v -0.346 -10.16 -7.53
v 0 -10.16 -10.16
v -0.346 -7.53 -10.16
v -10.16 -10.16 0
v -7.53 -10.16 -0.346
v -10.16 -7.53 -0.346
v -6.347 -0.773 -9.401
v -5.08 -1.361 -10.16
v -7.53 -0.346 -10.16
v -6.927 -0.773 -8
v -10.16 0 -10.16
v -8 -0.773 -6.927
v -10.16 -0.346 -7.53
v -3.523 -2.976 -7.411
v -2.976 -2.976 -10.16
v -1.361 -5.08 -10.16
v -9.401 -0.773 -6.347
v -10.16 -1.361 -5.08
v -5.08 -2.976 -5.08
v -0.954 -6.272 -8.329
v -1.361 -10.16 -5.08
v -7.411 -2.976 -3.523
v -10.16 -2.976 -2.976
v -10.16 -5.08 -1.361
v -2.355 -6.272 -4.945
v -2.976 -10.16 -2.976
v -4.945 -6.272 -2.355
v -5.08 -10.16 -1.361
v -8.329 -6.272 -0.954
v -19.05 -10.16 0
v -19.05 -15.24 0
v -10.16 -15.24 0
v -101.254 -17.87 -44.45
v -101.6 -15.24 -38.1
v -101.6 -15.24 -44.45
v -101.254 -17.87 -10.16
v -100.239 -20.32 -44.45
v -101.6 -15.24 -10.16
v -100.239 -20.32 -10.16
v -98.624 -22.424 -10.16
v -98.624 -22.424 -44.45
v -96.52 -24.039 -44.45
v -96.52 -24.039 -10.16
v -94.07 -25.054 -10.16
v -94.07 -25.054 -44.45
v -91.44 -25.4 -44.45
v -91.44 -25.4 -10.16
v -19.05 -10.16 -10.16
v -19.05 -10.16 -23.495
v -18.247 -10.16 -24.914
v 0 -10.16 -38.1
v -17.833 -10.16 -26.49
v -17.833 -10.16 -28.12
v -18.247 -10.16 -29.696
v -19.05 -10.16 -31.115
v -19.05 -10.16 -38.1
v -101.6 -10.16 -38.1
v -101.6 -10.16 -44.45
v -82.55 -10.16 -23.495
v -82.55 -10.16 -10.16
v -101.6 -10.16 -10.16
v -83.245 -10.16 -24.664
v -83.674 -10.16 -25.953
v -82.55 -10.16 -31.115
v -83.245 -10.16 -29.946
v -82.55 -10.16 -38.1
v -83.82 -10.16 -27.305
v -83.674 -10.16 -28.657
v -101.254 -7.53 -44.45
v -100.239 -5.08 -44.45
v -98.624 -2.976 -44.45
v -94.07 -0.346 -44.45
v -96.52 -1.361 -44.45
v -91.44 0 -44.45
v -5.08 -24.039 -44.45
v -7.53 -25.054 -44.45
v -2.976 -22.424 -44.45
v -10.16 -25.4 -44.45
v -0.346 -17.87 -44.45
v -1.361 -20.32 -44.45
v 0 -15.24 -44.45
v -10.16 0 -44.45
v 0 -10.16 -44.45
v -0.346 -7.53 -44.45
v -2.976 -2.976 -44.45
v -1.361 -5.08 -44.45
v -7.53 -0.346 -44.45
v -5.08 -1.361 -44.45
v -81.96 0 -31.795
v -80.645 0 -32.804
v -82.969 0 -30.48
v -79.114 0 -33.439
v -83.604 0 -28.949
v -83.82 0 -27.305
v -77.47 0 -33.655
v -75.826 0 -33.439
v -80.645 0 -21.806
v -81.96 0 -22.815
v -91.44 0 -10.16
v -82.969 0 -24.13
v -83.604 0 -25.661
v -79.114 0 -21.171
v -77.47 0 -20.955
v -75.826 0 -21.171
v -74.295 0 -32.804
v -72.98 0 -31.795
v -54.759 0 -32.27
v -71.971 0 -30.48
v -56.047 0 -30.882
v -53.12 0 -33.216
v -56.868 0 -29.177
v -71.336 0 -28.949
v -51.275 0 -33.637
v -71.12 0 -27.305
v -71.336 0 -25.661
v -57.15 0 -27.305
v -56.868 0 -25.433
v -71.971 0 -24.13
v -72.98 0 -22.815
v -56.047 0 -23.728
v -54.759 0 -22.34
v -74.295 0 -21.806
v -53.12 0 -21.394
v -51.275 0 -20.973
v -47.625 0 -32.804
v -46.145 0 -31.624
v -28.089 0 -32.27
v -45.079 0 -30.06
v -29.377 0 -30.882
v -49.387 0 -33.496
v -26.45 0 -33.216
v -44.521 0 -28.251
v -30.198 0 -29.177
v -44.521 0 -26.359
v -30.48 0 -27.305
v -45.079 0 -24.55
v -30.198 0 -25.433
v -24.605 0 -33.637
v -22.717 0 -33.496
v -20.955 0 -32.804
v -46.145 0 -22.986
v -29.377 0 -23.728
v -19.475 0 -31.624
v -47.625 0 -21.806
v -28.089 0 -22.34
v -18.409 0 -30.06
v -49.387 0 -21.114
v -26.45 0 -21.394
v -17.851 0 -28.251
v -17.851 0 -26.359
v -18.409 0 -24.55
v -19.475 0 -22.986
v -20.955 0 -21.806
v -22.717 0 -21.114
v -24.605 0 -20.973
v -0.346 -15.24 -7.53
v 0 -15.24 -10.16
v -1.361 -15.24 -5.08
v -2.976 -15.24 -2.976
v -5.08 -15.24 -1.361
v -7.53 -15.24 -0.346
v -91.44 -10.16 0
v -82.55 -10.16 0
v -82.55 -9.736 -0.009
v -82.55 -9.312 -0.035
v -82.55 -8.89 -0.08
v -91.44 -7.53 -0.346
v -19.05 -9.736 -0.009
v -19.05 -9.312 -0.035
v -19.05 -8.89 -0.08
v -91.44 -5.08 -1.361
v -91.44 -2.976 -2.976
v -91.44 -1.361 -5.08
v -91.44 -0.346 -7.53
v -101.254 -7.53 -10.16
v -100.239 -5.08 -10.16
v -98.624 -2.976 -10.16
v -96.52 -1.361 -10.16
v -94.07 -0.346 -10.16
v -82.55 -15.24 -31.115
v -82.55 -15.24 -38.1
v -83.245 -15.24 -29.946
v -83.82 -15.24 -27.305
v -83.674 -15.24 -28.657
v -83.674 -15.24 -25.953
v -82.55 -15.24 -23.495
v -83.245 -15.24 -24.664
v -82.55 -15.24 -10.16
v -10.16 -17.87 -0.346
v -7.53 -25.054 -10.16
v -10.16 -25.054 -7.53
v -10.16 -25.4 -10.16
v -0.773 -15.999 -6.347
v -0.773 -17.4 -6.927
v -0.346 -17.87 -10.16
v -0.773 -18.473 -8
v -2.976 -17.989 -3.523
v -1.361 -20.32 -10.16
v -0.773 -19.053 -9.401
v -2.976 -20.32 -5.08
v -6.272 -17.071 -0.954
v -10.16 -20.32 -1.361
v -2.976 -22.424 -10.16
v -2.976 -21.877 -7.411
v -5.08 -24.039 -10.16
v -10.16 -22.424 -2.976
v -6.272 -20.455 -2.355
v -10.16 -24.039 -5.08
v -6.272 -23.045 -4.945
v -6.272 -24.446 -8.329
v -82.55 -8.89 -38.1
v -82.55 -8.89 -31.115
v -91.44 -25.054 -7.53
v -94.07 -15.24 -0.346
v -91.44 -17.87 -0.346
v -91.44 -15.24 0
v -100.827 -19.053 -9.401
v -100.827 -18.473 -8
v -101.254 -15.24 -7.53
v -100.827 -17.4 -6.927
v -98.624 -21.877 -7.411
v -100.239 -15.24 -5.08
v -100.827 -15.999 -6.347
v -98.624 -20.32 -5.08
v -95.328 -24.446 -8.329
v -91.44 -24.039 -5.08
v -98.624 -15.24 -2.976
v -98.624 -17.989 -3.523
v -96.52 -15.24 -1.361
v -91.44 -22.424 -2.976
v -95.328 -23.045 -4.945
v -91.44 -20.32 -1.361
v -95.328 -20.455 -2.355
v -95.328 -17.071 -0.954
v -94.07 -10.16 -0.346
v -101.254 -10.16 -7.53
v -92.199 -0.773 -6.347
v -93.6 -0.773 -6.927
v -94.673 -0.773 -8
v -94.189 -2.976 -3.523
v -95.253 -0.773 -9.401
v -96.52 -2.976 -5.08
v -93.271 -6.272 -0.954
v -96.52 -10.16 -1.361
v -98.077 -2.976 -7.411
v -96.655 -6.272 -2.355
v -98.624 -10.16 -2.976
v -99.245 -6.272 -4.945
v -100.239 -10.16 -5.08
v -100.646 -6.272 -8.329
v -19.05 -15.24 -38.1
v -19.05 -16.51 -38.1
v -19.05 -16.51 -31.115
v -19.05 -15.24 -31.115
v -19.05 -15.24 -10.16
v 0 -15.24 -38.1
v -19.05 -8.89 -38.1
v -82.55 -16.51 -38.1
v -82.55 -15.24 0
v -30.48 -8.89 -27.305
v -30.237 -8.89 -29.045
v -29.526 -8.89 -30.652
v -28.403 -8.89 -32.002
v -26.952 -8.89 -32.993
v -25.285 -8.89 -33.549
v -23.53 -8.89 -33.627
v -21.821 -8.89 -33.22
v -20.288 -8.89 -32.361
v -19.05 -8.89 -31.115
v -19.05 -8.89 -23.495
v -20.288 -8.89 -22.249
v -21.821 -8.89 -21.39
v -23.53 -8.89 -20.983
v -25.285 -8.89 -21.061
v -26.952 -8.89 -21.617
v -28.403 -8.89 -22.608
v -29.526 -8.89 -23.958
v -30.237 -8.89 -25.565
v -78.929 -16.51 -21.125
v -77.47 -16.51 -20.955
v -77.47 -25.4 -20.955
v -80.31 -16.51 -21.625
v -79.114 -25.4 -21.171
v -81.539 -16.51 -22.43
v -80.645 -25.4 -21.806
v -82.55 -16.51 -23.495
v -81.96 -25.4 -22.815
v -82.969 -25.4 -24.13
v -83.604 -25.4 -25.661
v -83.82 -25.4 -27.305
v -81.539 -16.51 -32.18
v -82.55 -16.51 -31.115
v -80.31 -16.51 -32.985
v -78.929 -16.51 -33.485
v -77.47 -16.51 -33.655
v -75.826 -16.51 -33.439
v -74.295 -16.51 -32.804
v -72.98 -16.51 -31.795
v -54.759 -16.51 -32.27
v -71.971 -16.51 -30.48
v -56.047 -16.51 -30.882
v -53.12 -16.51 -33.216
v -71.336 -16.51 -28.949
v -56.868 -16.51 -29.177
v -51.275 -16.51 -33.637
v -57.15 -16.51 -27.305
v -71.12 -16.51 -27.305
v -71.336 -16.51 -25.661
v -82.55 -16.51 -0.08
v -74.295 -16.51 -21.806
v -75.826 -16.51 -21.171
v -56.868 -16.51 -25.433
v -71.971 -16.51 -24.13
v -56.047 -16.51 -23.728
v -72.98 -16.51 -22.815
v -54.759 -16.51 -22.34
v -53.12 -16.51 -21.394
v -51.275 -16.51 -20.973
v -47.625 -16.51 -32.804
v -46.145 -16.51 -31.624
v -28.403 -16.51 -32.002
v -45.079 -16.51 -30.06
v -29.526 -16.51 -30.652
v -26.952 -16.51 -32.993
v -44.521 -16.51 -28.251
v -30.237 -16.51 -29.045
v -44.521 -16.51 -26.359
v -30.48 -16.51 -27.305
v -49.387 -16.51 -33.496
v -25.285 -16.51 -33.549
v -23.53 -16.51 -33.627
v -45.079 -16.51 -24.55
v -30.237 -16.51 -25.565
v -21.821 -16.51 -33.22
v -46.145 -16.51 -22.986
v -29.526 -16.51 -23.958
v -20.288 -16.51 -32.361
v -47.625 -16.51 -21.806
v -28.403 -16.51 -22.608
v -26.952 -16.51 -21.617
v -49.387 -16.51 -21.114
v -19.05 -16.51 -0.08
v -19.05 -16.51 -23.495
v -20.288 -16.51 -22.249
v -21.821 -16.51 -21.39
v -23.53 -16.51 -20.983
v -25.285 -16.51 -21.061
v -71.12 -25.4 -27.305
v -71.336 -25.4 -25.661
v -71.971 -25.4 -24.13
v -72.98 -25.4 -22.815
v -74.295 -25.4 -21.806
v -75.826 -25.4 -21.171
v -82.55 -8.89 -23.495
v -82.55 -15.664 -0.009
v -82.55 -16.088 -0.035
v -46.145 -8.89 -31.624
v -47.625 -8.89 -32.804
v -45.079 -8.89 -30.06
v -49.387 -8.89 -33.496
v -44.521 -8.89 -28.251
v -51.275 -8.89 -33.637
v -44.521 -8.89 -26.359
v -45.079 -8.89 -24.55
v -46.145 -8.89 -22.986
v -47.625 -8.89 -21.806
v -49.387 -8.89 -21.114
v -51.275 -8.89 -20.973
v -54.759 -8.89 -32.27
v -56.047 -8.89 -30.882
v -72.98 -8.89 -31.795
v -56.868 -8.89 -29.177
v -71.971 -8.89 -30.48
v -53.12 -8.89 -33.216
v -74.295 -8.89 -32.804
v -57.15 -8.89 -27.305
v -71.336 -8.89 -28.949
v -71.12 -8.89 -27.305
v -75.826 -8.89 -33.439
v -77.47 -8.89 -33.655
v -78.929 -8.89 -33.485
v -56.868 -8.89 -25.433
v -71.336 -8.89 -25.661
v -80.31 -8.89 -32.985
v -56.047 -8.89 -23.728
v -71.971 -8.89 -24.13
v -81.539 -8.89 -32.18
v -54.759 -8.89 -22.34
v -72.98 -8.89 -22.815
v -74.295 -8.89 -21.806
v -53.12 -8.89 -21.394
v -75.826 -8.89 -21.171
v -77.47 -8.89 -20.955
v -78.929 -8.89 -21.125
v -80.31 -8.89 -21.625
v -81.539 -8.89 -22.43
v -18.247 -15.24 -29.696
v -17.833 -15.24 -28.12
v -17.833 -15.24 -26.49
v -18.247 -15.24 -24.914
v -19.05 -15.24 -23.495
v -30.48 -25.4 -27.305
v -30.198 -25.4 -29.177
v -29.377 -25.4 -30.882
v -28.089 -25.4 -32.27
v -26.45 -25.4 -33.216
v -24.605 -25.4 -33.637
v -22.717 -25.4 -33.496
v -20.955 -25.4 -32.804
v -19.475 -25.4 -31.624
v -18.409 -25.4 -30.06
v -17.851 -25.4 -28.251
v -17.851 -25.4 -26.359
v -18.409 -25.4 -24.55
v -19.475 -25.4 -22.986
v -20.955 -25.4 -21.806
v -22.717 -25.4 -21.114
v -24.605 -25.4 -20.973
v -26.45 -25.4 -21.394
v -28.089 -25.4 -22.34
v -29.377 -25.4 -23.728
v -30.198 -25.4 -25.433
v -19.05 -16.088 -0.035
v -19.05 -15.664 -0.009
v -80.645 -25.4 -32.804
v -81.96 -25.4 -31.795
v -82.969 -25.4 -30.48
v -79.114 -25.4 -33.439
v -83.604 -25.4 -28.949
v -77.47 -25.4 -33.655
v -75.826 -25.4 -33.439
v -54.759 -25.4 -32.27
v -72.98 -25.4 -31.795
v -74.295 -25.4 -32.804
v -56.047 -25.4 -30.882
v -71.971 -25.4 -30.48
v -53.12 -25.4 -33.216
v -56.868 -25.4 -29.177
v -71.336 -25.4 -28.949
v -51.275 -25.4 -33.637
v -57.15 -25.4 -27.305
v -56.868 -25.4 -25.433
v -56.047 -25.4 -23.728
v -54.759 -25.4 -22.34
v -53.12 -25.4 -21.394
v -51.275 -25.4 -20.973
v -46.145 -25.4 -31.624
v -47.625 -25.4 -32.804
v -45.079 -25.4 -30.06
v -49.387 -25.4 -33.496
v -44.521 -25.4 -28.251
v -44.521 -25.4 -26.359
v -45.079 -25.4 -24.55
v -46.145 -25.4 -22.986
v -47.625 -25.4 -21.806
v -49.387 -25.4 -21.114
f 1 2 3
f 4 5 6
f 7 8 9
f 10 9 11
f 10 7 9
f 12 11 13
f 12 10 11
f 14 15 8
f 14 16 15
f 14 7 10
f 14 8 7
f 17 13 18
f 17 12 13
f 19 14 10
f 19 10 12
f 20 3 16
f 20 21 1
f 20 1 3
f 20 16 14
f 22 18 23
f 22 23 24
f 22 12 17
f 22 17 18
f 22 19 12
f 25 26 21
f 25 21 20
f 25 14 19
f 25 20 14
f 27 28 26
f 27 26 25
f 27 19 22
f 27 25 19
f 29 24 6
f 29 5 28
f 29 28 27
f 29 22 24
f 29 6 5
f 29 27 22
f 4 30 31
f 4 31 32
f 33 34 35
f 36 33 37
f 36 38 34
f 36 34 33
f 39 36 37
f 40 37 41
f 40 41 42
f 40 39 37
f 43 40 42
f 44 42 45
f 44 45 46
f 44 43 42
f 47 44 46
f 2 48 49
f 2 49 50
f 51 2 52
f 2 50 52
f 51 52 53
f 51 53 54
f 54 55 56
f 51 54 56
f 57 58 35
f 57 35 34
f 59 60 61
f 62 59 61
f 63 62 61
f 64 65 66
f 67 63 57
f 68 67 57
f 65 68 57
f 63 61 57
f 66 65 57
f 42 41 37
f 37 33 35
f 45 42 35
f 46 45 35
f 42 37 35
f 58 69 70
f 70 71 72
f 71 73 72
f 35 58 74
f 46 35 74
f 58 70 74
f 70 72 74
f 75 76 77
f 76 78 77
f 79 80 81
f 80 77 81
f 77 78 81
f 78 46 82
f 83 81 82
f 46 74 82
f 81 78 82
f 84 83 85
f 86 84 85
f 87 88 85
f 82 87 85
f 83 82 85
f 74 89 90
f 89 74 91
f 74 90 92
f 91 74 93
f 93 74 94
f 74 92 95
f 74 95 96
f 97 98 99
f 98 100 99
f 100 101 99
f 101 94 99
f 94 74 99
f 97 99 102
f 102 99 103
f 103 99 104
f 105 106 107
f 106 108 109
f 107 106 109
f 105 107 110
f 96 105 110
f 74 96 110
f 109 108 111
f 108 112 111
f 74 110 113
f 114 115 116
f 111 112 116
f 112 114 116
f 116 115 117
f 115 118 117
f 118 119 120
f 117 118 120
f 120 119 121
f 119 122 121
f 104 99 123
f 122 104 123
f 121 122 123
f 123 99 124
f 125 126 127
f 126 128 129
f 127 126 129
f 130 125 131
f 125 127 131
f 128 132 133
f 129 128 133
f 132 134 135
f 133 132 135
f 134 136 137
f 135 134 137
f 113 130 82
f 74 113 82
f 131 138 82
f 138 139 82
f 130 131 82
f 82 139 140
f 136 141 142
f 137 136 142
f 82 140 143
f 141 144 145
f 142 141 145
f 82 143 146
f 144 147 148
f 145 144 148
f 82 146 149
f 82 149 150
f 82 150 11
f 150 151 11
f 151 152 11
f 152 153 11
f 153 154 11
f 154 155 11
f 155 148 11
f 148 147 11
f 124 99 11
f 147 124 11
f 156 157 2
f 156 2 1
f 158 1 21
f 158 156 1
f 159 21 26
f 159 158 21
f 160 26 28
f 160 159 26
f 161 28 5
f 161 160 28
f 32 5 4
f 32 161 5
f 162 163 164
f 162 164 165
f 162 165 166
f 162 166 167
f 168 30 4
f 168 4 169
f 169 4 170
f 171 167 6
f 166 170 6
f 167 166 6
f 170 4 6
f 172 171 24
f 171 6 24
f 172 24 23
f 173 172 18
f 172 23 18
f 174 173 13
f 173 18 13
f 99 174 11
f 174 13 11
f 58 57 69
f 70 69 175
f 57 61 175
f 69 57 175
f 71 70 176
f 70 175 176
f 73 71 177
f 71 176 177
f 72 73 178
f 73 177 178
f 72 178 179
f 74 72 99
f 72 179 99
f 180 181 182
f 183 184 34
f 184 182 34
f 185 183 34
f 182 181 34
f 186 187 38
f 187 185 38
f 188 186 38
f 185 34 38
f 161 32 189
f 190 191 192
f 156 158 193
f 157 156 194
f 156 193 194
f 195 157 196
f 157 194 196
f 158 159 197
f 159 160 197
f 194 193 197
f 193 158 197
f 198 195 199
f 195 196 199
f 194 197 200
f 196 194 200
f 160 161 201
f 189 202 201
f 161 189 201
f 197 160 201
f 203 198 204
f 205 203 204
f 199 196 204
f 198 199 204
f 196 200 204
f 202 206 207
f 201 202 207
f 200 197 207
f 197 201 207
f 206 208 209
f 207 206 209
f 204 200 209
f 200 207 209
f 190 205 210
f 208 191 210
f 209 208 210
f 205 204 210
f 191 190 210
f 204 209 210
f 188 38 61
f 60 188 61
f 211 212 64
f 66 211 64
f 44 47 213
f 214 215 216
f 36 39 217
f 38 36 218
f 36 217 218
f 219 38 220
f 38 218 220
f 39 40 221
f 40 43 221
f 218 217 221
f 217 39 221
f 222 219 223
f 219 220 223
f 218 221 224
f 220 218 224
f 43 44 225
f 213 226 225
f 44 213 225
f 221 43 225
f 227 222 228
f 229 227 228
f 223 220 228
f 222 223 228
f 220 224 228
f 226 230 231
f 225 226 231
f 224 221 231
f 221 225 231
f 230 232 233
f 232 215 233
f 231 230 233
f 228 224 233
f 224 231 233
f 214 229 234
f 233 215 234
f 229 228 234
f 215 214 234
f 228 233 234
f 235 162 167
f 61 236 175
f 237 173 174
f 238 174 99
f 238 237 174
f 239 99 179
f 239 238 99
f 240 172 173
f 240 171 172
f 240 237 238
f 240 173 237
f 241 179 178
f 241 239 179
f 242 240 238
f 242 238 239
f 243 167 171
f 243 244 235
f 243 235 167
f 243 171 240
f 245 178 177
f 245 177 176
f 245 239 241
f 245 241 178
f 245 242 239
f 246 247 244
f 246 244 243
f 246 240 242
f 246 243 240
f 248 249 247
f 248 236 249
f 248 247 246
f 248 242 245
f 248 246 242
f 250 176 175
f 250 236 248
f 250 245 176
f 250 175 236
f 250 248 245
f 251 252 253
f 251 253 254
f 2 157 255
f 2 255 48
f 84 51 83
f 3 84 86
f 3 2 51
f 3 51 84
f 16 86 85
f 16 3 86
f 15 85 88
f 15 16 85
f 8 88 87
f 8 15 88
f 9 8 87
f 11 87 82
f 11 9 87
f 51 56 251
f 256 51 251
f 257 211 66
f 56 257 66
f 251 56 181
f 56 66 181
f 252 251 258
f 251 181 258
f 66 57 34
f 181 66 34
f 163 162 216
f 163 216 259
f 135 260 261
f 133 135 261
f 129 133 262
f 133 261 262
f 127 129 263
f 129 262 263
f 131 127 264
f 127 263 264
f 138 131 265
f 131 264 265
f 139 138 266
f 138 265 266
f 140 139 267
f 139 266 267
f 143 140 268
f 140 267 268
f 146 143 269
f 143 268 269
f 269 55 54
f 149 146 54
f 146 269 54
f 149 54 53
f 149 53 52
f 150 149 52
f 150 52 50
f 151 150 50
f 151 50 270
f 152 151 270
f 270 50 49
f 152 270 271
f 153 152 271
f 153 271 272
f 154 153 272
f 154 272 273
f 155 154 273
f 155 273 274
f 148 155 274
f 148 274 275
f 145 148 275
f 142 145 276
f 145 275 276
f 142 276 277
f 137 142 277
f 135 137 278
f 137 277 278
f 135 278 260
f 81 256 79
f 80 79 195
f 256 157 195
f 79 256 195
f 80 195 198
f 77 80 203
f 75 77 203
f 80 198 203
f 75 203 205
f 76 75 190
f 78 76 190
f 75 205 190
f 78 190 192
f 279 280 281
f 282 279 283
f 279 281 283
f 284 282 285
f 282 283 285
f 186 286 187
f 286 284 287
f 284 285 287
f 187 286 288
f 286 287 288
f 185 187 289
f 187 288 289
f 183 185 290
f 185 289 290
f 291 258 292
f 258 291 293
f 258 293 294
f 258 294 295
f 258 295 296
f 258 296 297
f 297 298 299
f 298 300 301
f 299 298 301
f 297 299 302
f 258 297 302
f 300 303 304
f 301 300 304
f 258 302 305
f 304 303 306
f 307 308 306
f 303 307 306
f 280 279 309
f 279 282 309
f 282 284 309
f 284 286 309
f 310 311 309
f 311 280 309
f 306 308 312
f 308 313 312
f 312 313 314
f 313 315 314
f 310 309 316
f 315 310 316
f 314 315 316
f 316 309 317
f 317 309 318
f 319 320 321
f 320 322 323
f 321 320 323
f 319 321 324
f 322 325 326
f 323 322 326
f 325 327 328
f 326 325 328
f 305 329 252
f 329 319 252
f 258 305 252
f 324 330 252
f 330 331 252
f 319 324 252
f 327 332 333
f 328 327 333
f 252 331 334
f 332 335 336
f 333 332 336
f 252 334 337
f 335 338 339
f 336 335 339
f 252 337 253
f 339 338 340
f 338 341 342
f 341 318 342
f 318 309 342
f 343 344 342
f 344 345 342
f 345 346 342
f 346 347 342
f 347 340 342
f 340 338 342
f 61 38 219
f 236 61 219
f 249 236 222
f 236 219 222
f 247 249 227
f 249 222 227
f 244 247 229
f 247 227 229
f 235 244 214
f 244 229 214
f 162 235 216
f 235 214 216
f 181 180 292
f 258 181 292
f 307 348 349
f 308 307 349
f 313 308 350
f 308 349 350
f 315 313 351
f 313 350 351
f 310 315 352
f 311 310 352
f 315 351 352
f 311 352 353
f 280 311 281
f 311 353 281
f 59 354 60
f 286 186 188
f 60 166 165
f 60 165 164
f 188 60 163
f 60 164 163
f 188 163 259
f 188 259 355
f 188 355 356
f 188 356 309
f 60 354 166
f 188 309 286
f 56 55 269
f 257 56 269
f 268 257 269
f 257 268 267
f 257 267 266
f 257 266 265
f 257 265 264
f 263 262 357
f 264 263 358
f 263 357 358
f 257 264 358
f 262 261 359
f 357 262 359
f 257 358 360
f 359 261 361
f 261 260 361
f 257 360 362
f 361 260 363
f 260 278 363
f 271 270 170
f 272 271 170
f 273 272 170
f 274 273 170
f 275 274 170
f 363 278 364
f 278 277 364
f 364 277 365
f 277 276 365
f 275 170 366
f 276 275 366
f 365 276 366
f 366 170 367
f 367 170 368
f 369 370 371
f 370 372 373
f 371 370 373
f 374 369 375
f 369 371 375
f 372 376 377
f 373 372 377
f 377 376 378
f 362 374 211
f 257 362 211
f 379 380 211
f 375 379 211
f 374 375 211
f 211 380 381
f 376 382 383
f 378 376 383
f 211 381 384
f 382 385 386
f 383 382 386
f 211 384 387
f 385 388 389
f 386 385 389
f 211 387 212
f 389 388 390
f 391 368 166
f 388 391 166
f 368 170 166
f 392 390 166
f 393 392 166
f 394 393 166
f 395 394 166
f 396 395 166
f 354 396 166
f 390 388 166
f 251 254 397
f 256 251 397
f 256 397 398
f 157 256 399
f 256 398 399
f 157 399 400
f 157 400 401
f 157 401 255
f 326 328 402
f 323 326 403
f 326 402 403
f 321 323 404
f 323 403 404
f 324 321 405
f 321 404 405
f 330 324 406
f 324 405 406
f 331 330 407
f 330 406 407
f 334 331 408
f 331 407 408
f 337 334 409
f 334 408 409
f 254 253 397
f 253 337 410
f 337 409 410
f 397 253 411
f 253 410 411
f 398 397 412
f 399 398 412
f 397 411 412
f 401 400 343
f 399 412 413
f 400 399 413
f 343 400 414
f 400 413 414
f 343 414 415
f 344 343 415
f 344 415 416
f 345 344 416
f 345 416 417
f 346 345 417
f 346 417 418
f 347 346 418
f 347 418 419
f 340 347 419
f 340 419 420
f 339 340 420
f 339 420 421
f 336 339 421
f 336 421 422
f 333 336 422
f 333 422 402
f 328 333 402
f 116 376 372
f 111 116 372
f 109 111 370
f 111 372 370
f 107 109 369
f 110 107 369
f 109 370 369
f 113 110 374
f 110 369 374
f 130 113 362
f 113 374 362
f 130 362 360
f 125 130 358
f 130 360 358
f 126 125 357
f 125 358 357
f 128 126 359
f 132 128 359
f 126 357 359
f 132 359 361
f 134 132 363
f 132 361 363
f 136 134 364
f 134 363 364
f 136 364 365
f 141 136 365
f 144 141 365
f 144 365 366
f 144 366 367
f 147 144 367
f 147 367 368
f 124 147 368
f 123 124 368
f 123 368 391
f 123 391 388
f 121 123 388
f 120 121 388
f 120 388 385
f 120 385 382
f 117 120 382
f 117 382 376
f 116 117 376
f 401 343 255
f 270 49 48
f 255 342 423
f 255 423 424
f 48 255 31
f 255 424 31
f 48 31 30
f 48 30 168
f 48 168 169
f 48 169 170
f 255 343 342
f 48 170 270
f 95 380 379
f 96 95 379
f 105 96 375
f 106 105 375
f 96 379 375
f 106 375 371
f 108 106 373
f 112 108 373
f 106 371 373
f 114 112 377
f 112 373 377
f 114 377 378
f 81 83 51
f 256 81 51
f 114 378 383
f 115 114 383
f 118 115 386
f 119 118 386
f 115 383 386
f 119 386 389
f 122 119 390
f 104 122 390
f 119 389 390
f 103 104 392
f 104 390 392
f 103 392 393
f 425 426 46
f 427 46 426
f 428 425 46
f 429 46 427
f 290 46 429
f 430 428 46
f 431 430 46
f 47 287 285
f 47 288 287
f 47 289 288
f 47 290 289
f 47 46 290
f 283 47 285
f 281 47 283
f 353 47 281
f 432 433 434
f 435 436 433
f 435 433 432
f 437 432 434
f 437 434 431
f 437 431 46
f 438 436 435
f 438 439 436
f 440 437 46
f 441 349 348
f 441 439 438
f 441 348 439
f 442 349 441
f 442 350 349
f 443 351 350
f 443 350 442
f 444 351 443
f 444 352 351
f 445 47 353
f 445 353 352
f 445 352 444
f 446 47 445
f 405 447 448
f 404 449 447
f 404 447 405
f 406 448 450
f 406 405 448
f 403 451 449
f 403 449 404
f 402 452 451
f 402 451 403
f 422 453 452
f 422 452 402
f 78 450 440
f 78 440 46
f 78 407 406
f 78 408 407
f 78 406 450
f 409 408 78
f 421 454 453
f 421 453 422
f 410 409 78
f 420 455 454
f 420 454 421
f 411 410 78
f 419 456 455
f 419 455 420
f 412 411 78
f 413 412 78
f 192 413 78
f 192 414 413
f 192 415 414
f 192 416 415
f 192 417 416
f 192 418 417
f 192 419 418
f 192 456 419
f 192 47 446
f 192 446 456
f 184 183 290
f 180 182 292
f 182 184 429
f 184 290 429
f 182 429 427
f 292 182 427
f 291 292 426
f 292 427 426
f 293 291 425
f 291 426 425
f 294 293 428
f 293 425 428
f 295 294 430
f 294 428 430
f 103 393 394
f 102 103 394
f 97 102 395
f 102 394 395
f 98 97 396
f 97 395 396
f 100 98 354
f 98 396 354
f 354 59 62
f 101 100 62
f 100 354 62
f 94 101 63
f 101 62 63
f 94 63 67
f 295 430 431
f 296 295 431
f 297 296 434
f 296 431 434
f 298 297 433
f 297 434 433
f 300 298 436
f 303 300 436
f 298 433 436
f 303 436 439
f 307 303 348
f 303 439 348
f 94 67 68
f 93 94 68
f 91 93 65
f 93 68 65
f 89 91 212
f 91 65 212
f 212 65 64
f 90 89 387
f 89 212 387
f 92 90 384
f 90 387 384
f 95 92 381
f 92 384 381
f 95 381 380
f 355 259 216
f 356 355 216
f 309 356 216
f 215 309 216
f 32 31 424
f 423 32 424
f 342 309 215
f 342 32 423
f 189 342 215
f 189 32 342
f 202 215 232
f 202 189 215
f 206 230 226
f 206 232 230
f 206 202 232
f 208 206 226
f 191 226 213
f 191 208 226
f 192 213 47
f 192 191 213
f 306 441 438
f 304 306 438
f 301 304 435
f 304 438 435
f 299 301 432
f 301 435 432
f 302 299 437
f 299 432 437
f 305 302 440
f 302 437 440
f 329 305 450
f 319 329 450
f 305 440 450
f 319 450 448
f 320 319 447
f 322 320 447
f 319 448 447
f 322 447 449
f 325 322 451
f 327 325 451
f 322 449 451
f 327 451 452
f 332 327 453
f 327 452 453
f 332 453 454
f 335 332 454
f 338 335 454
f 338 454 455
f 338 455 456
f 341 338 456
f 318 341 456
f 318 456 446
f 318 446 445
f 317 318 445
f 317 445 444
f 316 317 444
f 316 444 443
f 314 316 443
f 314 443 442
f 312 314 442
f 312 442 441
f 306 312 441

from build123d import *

# Parameters (mm, degrees)
F0_W     = 101.6
F0_H     = 44.45
F1_DEPTH = 25.4
F2_R     = 10.16
F4_DEPTH = 101.6
F6_DEPTH = 25.4
F8_DEPTH = 38.1


with BuildPart() as f1:
    # F0 (on Front) → F1 (new body)
    with BuildSketch(Plane.XZ):
        with Locations((-50.8, -22.225)):
            Rectangle(F0_W, F0_H)
    extrude(amount=F1_DEPTH)

    # F2
    f2_edges = [f1.edges().sort_by_distance(p)[0] for p in [
        (-50.8, -25.4, 0),
        (0, -12.7, 0),
        (0, -25.4, -22.225),
        (0, 0, -22.225),
        (-101.6, -25.4, -22.225),
        (-101.6, -12.7, 0),
        (-50.8, 0, 0),
        (-101.6, 0, -22.225),
    ]]
    fillet(f2_edges, radius=F2_R)

    # F3 (on face) → F4 (cut)
    with BuildSketch(Plane(origin=(-101.6, 0, 0), x_dir=(0, -1, 0), z_dir=(-1, 0, 0))):
        Polygon((15.24, -10.16), (10.16, -10.16), (10.16, -38.1), (12.7, -38.1), (15.24, -38.1), align=None)
    extrude(amount=-F4_DEPTH, mode=Mode.SUBTRACT)

    # F5 (on face) → F6 (cut)
    with BuildSketch(Plane.XZ.offset(25.4)):
        with BuildLine():
            Line((-77.47, -27.305), (-71.12, -27.305))
            ThreePointArc((-71.12, -27.305), (-72.979872, -22.814872), (-77.47, -20.955))
            Line((-77.47, -20.955), (-77.47, -27.305))
        make_face()
        with BuildLine():
            ThreePointArc((-17.78, -27.305), (-24.13, -20.955), (-30.48, -27.305))
            Line((-30.48, -27.305), (-24.13, -27.305))
            Line((-24.13, -27.305), (-17.78, -27.305))
        make_face()
        with BuildLine():
            Line((-24.13, -27.305), (-30.48, -27.305))
            ThreePointArc((-30.48, -27.305), (-24.13, -33.655), (-17.78, -27.305))
            Line((-17.78, -27.305), (-24.13, -27.305))
        make_face()
        with BuildLine():
            ThreePointArc((-44.45, -27.305), (-50.8, -20.955), (-57.15, -27.305))
            Line((-57.15, -27.305), (-50.8, -27.305))
            Line((-50.8, -27.305), (-44.45, -27.305))
        make_face()
        with BuildLine():
            Line((-50.8, -27.305), (-57.15, -27.305))
            ThreePointArc((-57.15, -27.305), (-50.8, -33.655), (-44.45, -27.305))
            Line((-44.45, -27.305), (-50.8, -27.305))
        make_face()
        with BuildLine():
            ThreePointArc((-77.47, -33.655), (-72.979872, -31.795128), (-71.12, -27.305))
            Line((-71.12, -27.305), (-77.47, -27.305))
            Line((-77.47, -27.305), (-77.47, -33.655))
        make_face()
        with BuildLine():
            Line((-77.47, -27.305), (-77.47, -20.955))
            ThreePointArc((-77.47, -20.955), (-81.960128, -22.814872), (-83.82, -27.305))
            Line((-83.82, -27.305), (-77.47, -27.305))
        make_face()
        with BuildLine():
            ThreePointArc((-83.82, -27.305), (-81.960128, -31.795128), (-77.47, -33.655))
            Line((-77.47, -33.655), (-77.47, -27.305))
            Line((-77.47, -27.305), (-83.82, -27.305))
        make_face()
    extrude(amount=-F6_DEPTH, mode=Mode.SUBTRACT)

    # F7 (on face) → F8 (cut)
    with BuildSketch(Plane.XY):
        Polygon((-50.8, -8.89), (-82.55, -8.89), (-82.55, -12.7), (-82.55, -16.51), (-50.8, -16.51), (-19.05, -16.51), (-19.05, -12.7), (-19.05, -8.89), align=None)
    extrude(amount=-F8_DEPTH, mode=Mode.SUBTRACT)


solid = f1.part
